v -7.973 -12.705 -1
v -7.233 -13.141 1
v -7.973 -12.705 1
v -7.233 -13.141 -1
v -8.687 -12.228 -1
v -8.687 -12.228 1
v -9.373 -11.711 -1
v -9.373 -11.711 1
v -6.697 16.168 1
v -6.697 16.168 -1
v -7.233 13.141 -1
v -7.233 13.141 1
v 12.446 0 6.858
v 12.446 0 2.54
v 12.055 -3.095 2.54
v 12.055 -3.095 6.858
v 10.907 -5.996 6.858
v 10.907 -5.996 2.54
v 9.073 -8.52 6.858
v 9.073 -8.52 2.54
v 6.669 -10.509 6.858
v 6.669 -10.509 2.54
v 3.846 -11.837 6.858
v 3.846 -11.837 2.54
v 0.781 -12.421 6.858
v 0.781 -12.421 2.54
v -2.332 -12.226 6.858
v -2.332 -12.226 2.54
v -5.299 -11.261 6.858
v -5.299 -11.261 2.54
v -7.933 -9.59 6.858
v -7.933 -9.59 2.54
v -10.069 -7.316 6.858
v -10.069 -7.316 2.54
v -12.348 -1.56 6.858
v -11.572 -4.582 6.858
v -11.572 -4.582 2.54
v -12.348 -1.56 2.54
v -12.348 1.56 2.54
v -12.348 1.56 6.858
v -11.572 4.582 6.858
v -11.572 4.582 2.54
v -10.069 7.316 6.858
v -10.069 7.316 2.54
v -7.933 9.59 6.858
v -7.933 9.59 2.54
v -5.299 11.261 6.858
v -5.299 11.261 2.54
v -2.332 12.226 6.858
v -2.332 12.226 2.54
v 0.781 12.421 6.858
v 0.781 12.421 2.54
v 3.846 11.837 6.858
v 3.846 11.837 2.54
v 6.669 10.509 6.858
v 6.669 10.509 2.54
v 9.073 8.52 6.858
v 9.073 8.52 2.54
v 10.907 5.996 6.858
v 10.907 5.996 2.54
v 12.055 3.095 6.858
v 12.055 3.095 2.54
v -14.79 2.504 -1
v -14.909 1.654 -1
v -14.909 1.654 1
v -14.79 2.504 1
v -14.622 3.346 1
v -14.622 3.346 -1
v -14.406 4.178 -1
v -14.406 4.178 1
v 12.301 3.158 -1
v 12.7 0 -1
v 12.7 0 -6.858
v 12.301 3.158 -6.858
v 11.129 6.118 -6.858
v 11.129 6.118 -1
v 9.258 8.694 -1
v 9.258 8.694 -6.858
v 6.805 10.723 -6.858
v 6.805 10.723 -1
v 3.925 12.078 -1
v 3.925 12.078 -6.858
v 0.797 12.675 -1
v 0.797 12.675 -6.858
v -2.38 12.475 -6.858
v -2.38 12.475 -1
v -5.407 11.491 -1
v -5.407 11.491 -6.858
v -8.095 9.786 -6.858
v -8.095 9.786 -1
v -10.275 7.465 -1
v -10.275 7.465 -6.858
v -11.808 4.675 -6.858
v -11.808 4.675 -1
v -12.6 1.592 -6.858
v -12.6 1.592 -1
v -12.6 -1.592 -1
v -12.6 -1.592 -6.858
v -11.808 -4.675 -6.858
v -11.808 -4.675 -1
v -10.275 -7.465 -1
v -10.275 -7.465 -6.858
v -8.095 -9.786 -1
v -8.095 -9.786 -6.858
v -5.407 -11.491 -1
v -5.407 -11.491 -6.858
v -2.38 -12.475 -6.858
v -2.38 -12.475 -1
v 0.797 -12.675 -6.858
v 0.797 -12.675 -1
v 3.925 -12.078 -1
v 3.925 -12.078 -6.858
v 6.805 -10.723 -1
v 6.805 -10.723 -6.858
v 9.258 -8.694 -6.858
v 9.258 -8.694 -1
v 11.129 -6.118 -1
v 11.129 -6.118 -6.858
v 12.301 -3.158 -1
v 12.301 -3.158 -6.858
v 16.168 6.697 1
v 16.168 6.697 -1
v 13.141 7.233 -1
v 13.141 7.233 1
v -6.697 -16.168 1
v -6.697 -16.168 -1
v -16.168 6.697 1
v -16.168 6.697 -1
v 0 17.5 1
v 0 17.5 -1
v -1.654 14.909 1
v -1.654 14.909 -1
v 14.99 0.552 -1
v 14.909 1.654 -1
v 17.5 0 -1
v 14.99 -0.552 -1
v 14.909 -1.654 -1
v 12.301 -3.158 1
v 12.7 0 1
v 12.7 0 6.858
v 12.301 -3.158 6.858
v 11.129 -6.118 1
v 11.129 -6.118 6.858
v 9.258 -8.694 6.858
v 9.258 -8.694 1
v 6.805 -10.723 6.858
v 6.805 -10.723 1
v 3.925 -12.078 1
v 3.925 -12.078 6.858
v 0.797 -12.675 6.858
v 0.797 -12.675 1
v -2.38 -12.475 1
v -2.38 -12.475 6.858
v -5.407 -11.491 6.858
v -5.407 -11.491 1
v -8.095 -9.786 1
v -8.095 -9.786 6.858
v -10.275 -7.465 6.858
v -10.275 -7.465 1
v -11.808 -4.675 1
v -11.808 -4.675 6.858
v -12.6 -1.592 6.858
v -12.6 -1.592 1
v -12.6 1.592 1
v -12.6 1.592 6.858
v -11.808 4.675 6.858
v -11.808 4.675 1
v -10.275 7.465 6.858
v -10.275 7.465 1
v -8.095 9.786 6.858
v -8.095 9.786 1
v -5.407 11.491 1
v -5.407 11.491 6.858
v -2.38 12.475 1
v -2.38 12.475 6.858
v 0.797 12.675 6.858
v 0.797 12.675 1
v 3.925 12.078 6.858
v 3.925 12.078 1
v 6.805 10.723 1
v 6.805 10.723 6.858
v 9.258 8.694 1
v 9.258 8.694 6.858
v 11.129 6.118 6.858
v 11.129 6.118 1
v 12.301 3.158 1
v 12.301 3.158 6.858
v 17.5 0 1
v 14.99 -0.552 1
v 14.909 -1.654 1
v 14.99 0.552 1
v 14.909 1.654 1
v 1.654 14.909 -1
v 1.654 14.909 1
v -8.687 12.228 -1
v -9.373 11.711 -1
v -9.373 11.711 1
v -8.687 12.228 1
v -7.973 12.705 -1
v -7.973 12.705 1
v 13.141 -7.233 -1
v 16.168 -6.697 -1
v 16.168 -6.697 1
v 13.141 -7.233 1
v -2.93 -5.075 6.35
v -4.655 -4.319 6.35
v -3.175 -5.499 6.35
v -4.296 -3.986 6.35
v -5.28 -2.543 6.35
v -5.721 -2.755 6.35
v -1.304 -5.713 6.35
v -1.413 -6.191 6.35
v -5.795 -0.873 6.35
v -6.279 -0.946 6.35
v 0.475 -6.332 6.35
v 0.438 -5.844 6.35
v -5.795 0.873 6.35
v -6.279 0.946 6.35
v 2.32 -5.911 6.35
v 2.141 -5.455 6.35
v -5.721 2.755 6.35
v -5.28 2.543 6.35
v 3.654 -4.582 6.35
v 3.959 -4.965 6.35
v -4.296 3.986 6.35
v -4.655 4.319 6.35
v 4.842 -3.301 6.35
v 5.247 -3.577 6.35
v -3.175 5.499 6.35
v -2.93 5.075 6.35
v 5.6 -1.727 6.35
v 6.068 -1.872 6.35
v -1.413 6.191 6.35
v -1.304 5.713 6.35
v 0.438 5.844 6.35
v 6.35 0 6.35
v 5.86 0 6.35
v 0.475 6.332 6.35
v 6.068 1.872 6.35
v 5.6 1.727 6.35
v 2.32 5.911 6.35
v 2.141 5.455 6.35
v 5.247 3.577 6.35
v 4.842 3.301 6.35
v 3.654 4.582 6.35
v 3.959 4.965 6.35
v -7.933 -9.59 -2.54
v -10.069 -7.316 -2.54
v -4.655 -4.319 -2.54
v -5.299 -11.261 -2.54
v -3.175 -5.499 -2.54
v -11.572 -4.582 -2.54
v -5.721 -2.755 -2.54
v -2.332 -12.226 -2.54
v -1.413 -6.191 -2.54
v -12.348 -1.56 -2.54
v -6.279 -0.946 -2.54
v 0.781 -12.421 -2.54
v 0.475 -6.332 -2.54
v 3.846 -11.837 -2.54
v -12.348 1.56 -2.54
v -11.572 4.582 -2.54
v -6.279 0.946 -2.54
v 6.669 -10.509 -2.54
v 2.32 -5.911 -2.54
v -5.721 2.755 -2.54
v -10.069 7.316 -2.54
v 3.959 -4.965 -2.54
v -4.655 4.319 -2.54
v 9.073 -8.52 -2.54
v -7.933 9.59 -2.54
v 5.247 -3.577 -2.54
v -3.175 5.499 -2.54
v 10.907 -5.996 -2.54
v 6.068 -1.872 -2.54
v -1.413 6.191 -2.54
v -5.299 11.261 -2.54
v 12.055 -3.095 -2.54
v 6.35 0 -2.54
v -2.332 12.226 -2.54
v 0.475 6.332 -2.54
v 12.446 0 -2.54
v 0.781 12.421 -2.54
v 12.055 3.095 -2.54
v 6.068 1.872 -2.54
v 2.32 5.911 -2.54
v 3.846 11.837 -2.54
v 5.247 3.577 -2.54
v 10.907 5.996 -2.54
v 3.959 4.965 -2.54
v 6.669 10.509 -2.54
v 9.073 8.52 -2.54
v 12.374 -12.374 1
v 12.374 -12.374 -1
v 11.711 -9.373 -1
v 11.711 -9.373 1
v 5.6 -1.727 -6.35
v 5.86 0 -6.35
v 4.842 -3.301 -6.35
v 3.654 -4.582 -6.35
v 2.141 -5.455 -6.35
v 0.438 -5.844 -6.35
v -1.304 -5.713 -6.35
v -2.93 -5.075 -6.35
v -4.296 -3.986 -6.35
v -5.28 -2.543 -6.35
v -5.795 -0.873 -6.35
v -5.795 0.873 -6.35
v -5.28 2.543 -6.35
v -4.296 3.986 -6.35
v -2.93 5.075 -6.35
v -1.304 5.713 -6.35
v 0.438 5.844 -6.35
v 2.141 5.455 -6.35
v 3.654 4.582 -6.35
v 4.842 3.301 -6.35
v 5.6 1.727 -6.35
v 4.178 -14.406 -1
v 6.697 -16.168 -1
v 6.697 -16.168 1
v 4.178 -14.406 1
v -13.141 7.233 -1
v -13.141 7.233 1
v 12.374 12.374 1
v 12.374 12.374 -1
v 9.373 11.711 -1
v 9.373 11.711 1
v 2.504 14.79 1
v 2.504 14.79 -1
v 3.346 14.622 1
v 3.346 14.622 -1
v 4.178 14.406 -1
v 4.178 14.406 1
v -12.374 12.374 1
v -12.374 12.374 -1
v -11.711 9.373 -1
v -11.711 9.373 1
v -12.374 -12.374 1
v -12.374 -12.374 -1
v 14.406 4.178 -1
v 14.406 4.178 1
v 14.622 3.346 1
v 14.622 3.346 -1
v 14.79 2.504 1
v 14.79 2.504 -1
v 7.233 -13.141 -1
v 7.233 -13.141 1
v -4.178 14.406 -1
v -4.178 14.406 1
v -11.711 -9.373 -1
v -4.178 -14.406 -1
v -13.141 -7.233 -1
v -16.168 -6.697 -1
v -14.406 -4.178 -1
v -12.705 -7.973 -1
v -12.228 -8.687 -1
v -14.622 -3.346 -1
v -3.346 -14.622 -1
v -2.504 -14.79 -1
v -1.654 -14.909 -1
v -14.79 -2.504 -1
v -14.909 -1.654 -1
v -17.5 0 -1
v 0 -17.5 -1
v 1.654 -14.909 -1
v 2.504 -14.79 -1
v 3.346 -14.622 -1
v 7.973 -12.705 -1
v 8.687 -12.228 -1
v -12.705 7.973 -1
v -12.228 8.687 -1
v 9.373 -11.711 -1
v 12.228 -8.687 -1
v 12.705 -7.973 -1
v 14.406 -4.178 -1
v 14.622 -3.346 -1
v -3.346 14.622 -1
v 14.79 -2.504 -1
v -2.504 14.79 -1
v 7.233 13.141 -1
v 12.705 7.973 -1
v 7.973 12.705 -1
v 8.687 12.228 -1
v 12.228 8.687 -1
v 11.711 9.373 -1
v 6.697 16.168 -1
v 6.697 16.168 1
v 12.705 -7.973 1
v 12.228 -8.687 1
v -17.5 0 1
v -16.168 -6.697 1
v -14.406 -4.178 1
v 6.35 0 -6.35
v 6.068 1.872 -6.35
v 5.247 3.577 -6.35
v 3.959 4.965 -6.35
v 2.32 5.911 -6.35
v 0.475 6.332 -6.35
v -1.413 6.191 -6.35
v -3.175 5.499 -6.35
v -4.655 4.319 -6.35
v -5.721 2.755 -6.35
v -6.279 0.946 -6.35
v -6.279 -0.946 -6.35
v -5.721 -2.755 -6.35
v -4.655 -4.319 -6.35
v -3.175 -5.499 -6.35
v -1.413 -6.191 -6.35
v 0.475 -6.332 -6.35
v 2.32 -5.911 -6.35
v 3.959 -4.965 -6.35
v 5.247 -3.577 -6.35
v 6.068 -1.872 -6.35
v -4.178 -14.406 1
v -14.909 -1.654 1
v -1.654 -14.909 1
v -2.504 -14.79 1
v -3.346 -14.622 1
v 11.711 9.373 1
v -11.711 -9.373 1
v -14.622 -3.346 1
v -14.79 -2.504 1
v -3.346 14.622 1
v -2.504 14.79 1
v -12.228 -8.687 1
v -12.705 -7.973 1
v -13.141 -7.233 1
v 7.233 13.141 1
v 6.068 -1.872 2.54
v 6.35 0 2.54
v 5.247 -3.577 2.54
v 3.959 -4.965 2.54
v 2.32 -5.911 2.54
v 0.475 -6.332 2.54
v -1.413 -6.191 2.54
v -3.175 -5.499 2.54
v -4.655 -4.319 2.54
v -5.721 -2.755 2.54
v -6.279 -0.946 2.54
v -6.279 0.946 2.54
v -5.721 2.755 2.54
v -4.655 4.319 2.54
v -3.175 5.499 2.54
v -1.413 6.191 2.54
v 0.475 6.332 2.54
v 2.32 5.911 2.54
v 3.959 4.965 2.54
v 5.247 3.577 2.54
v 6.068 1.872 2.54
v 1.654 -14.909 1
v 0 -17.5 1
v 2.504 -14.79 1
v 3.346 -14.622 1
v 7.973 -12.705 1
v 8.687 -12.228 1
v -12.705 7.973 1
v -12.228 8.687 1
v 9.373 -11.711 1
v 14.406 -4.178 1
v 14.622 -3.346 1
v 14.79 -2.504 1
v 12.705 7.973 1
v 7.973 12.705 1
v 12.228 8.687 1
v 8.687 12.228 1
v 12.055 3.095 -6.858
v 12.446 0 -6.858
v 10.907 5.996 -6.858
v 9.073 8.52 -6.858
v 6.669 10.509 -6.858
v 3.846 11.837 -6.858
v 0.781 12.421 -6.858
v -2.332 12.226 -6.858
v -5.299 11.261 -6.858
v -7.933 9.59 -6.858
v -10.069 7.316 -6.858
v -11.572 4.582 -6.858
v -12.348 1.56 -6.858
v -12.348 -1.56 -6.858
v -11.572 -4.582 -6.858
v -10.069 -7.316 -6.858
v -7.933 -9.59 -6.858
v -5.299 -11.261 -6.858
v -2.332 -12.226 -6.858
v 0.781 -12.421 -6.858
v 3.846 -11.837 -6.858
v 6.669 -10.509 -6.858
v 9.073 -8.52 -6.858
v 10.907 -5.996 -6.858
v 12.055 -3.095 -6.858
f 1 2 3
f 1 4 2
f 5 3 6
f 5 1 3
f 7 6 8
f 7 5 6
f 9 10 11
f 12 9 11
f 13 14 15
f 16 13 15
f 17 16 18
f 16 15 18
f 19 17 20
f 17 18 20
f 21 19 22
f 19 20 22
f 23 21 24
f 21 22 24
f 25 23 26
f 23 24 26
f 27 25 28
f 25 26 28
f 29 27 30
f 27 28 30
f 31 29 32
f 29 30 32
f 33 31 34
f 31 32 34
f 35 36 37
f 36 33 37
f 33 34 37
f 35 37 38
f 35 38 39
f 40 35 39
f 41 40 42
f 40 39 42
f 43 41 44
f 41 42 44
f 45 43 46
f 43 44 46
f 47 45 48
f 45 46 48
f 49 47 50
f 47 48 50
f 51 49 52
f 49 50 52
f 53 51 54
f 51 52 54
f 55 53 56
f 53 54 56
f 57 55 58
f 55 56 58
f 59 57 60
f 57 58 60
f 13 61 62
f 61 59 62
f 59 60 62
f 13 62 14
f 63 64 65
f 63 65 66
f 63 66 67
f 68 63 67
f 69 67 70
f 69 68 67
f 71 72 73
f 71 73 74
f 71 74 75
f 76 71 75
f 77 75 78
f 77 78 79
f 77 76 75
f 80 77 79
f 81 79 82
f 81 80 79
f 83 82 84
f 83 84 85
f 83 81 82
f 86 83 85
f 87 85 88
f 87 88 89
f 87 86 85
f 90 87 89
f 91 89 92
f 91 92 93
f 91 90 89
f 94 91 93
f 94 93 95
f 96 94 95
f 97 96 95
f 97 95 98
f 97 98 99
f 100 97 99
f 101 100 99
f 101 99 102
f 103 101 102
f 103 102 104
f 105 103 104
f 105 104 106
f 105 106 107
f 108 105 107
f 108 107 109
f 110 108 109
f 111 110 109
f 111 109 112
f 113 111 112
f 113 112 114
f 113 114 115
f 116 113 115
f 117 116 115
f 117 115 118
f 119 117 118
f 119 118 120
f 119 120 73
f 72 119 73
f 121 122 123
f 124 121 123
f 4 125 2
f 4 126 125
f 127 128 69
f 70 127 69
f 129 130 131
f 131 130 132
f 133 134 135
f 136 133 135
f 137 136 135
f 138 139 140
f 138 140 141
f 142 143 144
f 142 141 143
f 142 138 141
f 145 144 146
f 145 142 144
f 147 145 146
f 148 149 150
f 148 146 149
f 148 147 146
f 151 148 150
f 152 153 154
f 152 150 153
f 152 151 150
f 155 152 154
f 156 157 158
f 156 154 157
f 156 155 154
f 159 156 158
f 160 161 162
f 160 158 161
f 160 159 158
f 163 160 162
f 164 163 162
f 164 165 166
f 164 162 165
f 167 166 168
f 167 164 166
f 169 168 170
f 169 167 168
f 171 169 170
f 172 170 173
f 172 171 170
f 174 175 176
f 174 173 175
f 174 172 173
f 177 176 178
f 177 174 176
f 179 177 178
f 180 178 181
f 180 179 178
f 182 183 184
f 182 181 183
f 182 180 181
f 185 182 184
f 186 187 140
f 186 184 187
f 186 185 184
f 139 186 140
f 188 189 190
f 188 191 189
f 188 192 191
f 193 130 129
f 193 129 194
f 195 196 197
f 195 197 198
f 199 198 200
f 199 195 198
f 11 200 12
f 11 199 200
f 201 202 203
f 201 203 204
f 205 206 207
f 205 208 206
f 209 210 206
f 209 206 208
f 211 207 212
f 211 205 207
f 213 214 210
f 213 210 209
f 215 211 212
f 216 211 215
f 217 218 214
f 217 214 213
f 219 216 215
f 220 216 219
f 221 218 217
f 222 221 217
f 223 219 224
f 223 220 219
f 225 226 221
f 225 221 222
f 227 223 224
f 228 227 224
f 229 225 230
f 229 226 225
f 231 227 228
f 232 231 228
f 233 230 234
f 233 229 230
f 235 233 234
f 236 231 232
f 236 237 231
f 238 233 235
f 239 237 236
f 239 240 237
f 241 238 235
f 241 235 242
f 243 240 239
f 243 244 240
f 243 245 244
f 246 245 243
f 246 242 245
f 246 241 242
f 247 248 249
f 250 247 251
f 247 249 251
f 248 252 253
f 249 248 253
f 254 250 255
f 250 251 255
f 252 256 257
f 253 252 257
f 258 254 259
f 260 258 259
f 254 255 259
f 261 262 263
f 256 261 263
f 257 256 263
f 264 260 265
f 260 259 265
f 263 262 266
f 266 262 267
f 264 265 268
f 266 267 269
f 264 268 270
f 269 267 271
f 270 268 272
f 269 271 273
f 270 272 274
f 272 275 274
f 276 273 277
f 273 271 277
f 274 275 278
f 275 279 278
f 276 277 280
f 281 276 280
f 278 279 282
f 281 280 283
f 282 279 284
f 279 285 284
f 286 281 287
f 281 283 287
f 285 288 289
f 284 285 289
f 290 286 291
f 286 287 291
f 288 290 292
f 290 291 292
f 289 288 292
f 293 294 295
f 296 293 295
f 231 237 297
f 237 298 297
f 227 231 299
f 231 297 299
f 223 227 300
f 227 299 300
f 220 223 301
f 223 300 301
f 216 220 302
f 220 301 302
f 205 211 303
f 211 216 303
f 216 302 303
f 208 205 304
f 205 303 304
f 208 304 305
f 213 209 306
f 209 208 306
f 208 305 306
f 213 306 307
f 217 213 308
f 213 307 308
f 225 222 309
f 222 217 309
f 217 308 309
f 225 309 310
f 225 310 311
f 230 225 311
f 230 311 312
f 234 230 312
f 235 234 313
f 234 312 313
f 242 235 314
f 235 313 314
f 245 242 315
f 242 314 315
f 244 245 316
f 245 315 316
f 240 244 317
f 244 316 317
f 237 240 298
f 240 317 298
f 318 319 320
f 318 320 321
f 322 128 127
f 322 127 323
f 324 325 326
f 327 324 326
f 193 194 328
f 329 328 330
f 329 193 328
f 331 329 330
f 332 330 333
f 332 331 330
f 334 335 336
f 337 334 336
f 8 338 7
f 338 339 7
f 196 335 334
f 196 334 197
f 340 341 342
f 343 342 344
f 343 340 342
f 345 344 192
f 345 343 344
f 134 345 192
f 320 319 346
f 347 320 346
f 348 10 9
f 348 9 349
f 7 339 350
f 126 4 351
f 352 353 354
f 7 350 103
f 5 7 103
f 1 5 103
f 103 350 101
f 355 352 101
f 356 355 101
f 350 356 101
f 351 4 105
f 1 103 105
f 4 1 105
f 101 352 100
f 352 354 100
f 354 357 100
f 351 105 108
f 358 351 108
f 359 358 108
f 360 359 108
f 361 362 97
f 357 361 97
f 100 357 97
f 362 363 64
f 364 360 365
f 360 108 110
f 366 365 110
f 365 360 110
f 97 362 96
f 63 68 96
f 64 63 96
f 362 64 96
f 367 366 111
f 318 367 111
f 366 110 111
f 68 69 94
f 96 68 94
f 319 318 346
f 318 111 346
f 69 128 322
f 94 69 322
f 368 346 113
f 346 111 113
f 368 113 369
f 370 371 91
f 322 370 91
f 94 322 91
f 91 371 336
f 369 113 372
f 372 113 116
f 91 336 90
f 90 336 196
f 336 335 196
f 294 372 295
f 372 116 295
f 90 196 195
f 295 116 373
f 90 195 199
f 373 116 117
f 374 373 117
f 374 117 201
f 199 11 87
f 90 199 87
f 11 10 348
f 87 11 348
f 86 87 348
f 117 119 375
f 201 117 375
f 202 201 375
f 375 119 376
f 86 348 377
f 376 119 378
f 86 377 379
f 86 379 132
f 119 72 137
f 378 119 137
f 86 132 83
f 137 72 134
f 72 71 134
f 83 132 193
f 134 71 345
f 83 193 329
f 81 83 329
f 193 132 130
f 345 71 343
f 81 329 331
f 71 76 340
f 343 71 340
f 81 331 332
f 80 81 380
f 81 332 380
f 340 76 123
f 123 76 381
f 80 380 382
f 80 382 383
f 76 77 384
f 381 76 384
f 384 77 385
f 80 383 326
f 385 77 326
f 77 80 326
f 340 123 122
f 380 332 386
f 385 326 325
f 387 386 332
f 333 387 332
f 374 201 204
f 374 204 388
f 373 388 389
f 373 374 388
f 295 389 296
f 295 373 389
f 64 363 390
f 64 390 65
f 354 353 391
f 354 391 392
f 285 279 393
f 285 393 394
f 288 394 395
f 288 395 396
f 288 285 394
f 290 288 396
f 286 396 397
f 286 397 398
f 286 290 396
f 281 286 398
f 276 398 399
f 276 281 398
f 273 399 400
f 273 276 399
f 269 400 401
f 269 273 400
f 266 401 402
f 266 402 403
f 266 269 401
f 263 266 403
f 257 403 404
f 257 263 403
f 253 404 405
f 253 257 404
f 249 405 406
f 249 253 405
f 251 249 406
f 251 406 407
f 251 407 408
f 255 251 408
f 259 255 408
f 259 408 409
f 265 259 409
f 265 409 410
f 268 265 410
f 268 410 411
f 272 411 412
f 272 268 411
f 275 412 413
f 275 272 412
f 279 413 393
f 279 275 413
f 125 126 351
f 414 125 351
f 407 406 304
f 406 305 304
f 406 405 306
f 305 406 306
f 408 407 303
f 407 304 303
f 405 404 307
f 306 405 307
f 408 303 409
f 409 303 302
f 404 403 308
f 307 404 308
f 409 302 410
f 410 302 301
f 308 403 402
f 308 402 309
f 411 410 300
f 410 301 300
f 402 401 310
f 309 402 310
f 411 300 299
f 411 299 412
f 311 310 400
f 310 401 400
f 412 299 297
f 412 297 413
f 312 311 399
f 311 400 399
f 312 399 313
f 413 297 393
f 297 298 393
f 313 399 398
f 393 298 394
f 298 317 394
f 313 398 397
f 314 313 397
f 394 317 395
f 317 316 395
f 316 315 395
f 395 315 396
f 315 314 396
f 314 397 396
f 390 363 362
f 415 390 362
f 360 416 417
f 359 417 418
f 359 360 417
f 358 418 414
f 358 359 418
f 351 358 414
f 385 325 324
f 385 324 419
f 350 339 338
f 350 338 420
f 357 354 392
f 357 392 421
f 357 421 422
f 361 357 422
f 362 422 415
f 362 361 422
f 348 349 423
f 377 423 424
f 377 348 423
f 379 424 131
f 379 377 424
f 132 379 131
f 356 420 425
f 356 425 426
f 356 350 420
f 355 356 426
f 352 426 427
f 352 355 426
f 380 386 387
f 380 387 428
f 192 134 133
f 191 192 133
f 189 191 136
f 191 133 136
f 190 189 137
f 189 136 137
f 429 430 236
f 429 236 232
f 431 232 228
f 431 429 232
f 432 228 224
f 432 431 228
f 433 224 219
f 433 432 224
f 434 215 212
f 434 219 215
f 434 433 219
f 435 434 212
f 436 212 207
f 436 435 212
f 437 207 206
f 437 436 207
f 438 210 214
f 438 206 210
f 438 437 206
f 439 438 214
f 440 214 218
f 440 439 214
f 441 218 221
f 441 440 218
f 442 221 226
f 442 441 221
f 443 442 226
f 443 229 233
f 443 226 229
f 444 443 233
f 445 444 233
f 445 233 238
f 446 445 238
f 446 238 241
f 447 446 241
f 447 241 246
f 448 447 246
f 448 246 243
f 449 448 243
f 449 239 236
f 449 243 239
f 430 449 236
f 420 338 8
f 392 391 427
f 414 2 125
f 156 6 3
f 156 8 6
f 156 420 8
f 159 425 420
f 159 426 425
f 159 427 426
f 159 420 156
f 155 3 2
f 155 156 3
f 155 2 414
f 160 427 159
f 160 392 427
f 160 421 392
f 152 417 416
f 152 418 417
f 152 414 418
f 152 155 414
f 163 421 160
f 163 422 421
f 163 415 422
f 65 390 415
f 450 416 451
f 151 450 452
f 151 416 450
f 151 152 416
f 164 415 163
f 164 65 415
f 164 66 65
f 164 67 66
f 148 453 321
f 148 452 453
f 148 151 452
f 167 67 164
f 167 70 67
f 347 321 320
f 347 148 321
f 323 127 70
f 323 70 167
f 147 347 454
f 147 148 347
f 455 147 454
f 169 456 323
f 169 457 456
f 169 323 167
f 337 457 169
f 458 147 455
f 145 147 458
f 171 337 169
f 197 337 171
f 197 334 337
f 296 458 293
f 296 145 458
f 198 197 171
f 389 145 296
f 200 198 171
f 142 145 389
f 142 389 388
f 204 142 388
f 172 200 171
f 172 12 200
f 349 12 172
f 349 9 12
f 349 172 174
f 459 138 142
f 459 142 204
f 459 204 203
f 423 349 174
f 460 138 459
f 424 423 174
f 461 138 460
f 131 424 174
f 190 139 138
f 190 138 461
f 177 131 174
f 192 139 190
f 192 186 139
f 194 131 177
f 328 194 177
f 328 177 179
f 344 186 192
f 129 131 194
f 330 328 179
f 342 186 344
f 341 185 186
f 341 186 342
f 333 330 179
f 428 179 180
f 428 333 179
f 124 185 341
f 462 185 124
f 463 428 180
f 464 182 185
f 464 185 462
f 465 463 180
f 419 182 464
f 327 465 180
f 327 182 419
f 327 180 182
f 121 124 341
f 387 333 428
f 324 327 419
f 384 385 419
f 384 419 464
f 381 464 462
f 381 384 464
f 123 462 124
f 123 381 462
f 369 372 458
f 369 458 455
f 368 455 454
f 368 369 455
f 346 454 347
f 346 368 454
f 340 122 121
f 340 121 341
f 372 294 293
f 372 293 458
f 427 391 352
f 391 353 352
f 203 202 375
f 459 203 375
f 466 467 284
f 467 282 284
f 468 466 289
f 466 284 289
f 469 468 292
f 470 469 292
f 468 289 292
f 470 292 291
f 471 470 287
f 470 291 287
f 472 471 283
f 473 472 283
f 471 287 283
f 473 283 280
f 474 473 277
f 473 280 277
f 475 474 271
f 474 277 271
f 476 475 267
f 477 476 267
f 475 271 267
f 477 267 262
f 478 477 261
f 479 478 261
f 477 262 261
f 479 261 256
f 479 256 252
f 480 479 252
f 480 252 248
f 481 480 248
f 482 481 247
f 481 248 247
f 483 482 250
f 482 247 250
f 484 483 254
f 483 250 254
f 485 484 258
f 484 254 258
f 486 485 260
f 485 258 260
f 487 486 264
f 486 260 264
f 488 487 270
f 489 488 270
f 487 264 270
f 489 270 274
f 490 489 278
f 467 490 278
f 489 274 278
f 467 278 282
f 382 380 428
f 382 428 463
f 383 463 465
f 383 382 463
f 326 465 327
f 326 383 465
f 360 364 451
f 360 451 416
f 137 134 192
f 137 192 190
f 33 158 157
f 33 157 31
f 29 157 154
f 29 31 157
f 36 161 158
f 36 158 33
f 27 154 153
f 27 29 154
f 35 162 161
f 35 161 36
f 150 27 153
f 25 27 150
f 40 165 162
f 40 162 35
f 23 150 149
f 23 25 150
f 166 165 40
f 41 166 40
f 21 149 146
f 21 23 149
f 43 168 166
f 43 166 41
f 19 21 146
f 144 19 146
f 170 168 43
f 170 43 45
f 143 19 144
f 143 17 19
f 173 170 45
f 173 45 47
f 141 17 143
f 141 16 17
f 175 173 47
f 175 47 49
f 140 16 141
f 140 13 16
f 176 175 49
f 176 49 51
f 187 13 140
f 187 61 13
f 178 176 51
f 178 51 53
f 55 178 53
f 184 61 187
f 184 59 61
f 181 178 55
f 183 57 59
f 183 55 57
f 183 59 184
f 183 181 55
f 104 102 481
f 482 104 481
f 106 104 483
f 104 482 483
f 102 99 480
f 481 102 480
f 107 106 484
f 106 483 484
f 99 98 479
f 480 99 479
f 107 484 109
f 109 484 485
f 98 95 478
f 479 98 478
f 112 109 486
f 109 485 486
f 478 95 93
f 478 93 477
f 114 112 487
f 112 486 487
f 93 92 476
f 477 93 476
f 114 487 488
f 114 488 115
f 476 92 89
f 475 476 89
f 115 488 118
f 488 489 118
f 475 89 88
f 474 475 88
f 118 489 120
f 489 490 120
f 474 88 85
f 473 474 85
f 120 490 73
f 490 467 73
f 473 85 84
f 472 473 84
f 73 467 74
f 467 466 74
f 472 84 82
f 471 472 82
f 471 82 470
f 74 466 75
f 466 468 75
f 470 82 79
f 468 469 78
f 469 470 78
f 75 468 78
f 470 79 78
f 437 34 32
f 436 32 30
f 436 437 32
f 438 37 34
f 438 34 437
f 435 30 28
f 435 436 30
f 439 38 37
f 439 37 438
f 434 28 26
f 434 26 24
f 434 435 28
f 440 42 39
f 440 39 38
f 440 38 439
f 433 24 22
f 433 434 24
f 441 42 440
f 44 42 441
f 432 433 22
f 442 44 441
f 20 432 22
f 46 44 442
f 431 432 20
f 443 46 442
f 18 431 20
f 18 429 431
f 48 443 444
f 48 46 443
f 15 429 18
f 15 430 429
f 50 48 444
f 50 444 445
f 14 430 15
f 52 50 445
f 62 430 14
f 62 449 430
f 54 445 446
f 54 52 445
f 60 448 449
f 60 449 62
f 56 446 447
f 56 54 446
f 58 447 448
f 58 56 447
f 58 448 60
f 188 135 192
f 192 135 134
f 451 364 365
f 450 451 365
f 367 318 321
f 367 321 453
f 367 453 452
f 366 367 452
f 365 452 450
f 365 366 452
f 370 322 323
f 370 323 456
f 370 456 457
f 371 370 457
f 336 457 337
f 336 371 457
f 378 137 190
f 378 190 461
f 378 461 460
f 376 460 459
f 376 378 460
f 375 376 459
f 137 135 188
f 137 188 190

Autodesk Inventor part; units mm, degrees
ref_plane "YZ Plane" through (0, 0, 0) normal (1, 0, 0) x (0, 1, 0)
ref_plane "XZ Plane" through (0, 0, 0) normal (0, 1, 0) x (-1, 0, 0)
ref_plane "XY Plane" through (0, 0, 0) normal (0, 0, 1) x (1, 0, 0)
sketch "Sketch1" plane through (0, 0, 0) normal (0, 0, 1) x (1, 0, 0)
  circle A0 centre (0, 0) radius 12.7
  circle A1 centre (0, 0) radius 12.446
  circle A2 centre (0, 0) radius 6.35
  circle A3 centre (0, 0) radius 5.8601
  circle A4 centre (0, 0) radius 15
  line L0 (15, 0) -> (17.5, 0)
  line L1 (15, 0) -> (17.5, 0) construction
  line L2 (17.5, 0) -> (15, 0)
  line L3 (17.5, 0) -> (14.9086, 1.6536)
  line L4 (17.5, 0) -> (14.9086, -1.6536)
  line L5 (14.9086, 1.6536) -> (14.9086, -1.6536)
  line L6 (13.1409, 7.233) -> (14.4065, 4.1775)
  line L7 (16.1679, 6.697) -> (13.1409, 7.233)
  line L8 (16.1679, 6.697) -> (14.4065, 4.1775)
  line L9 (9.3727, 11.7112) -> (11.7112, 9.3727)
  line L10 (12.3744, 12.3744) -> (9.3727, 11.7112)
  line L11 (12.3744, 12.3744) -> (11.7112, 9.3727)
  line L12 (4.1775, 14.4065) -> (7.233, 13.1409)
  line L13 (6.697, 16.1679) -> (4.1775, 14.4065)
  line L14 (6.697, 16.1679) -> (7.233, 13.1409)
  line L15 (-1.6536, 14.9086) -> (1.6536, 14.9086)
  line L16 (0, 17.5) -> (-1.6536, 14.9086)
  line L17 (0, 17.5) -> (1.6536, 14.9086)
  line L18 (-7.233, 13.1409) -> (-4.1775, 14.4065)
  line L19 (-6.697, 16.1679) -> (-7.233, 13.1409)
  line L20 (-6.697, 16.1679) -> (-4.1775, 14.4065)
  line L21 (-11.7112, 9.3727) -> (-9.3727, 11.7112)
  line L22 (-12.3744, 12.3744) -> (-11.7112, 9.3727)
  line L23 (-12.3744, 12.3744) -> (-9.3727, 11.7112)
  line L24 (-14.4065, 4.1775) -> (-13.1409, 7.233)
  line L25 (-16.1679, 6.697) -> (-14.4065, 4.1775)
  line L26 (-16.1679, 6.697) -> (-13.1409, 7.233)
  line L27 (-14.9086, -1.6536) -> (-14.9086, 1.6536)
  line L28 (-17.5, 0) -> (-14.9086, -1.6536)
  line L29 (-17.5, 0) -> (-14.9086, 1.6536)
  line L30 (-13.1409, -7.233) -> (-14.4065, -4.1775)
  line L31 (-16.1679, -6.697) -> (-13.1409, -7.233)
  line L32 (-16.1679, -6.697) -> (-14.4065, -4.1775)
  line L33 (-9.3727, -11.7112) -> (-11.7112, -9.3727)
  line L34 (-12.3744, -12.3744) -> (-9.3727, -11.7112)
  line L35 (-12.3744, -12.3744) -> (-11.7112, -9.3727)
  line L36 (-4.1775, -14.4065) -> (-7.233, -13.1409)
  line L37 (-6.697, -16.1679) -> (-4.1775, -14.4065)
  line L38 (-6.697, -16.1679) -> (-7.233, -13.1409)
  line L39 (1.6536, -14.9086) -> (-1.6536, -14.9086)
  line L40 (0, -17.5) -> (1.6536, -14.9086)
  line L41 (0, -17.5) -> (-1.6536, -14.9086)
  line L42 (7.233, -13.1409) -> (4.1775, -14.4065)
  line L43 (6.697, -16.1679) -> (7.233, -13.1409)
  line L44 (6.697, -16.1679) -> (4.1775, -14.4065)
  line L45 (11.7112, -9.3727) -> (9.3727, -11.7112)
  line L46 (12.3744, -12.3744) -> (11.7112, -9.3727)
  line L47 (12.3744, -12.3744) -> (9.3727, -11.7112)
  line L48 (14.4065, -4.1775) -> (13.1409, -7.233)
  line L49 (16.1679, -6.697) -> (14.4065, -4.1775)
  line L50 (16.1679, -6.697) -> (13.1409, -7.233)
  dimension "d1" = 25.4
  dimension "d2" = 24.892
  dimension "d3" = 12.7
  dimension "d22" = 30
  dimension "d24" = 2.5
  dimension "d25" = 0
  dimension "d26" = 3.0741
  dimension "d27" = 1.6536
  dimension "d30" = 360
extrude "Extrusion1" [suppressed]
extrude "Extrusion2" add sketch "Sketch1" along normal blind 6.858 and the other way blind 6.858 contours A0
extrude "Extrusion3" add sketch "Sketch1" along normal blind 2.54 and the other way blind 2.54 contours A1
extrude "Extrusion4" add sketch "Sketch1" along normal blind 6.35 and the other way blind 6.35 contours A2
fillet "Fillet1" [suppressed]
fillet "Fillet2" [suppressed]
extrude "Extrusion5" add sketch "Sketch1" along normal mid plane 2 contours L0 L4 A4 | A4 L3 L0 | L6 A4 | A4 L7 L8 | L49 L50 A4 | A4 L48 | L9 A4 | A4 L10 L11 | L46 L47 A4 | A4 L45 | L12 A4 | A4 L13 L14 | L43 L44 A4 | A4 L42 | L15 A4 | A4 L16 L17 | L40 L41 A4 | A4 L39 | L18 A4 | A4 L19 L20 | L37 L38 A4 | A4 L36 | L21 A4 | A4 L22 L23 | L34 L35 A4 | A4 L33 | L24 A4 | A4 L25 L26 | L31 L32 A4 | A4 L30 | L27 A4 | A4 L28 L29
extrude "Extrusion6" add sketch "Sketch1" along normal mid plane 2 contours L5 A4 L48 L45 L42 L39 L36 L33 L30 L27 L24 L21 L18 L15 L12 L9 L6 | L6 A4 | A4 L48 | L9 A4 | A4 L45 | L12 A4 | A4 L42 | L15 A4 | A4 L39 | L18 A4 | A4 L36 | L21 A4 | A4 L33 | L24 A4 | A4 L30 | L27 A4
properties part number "plastic drive gear"
